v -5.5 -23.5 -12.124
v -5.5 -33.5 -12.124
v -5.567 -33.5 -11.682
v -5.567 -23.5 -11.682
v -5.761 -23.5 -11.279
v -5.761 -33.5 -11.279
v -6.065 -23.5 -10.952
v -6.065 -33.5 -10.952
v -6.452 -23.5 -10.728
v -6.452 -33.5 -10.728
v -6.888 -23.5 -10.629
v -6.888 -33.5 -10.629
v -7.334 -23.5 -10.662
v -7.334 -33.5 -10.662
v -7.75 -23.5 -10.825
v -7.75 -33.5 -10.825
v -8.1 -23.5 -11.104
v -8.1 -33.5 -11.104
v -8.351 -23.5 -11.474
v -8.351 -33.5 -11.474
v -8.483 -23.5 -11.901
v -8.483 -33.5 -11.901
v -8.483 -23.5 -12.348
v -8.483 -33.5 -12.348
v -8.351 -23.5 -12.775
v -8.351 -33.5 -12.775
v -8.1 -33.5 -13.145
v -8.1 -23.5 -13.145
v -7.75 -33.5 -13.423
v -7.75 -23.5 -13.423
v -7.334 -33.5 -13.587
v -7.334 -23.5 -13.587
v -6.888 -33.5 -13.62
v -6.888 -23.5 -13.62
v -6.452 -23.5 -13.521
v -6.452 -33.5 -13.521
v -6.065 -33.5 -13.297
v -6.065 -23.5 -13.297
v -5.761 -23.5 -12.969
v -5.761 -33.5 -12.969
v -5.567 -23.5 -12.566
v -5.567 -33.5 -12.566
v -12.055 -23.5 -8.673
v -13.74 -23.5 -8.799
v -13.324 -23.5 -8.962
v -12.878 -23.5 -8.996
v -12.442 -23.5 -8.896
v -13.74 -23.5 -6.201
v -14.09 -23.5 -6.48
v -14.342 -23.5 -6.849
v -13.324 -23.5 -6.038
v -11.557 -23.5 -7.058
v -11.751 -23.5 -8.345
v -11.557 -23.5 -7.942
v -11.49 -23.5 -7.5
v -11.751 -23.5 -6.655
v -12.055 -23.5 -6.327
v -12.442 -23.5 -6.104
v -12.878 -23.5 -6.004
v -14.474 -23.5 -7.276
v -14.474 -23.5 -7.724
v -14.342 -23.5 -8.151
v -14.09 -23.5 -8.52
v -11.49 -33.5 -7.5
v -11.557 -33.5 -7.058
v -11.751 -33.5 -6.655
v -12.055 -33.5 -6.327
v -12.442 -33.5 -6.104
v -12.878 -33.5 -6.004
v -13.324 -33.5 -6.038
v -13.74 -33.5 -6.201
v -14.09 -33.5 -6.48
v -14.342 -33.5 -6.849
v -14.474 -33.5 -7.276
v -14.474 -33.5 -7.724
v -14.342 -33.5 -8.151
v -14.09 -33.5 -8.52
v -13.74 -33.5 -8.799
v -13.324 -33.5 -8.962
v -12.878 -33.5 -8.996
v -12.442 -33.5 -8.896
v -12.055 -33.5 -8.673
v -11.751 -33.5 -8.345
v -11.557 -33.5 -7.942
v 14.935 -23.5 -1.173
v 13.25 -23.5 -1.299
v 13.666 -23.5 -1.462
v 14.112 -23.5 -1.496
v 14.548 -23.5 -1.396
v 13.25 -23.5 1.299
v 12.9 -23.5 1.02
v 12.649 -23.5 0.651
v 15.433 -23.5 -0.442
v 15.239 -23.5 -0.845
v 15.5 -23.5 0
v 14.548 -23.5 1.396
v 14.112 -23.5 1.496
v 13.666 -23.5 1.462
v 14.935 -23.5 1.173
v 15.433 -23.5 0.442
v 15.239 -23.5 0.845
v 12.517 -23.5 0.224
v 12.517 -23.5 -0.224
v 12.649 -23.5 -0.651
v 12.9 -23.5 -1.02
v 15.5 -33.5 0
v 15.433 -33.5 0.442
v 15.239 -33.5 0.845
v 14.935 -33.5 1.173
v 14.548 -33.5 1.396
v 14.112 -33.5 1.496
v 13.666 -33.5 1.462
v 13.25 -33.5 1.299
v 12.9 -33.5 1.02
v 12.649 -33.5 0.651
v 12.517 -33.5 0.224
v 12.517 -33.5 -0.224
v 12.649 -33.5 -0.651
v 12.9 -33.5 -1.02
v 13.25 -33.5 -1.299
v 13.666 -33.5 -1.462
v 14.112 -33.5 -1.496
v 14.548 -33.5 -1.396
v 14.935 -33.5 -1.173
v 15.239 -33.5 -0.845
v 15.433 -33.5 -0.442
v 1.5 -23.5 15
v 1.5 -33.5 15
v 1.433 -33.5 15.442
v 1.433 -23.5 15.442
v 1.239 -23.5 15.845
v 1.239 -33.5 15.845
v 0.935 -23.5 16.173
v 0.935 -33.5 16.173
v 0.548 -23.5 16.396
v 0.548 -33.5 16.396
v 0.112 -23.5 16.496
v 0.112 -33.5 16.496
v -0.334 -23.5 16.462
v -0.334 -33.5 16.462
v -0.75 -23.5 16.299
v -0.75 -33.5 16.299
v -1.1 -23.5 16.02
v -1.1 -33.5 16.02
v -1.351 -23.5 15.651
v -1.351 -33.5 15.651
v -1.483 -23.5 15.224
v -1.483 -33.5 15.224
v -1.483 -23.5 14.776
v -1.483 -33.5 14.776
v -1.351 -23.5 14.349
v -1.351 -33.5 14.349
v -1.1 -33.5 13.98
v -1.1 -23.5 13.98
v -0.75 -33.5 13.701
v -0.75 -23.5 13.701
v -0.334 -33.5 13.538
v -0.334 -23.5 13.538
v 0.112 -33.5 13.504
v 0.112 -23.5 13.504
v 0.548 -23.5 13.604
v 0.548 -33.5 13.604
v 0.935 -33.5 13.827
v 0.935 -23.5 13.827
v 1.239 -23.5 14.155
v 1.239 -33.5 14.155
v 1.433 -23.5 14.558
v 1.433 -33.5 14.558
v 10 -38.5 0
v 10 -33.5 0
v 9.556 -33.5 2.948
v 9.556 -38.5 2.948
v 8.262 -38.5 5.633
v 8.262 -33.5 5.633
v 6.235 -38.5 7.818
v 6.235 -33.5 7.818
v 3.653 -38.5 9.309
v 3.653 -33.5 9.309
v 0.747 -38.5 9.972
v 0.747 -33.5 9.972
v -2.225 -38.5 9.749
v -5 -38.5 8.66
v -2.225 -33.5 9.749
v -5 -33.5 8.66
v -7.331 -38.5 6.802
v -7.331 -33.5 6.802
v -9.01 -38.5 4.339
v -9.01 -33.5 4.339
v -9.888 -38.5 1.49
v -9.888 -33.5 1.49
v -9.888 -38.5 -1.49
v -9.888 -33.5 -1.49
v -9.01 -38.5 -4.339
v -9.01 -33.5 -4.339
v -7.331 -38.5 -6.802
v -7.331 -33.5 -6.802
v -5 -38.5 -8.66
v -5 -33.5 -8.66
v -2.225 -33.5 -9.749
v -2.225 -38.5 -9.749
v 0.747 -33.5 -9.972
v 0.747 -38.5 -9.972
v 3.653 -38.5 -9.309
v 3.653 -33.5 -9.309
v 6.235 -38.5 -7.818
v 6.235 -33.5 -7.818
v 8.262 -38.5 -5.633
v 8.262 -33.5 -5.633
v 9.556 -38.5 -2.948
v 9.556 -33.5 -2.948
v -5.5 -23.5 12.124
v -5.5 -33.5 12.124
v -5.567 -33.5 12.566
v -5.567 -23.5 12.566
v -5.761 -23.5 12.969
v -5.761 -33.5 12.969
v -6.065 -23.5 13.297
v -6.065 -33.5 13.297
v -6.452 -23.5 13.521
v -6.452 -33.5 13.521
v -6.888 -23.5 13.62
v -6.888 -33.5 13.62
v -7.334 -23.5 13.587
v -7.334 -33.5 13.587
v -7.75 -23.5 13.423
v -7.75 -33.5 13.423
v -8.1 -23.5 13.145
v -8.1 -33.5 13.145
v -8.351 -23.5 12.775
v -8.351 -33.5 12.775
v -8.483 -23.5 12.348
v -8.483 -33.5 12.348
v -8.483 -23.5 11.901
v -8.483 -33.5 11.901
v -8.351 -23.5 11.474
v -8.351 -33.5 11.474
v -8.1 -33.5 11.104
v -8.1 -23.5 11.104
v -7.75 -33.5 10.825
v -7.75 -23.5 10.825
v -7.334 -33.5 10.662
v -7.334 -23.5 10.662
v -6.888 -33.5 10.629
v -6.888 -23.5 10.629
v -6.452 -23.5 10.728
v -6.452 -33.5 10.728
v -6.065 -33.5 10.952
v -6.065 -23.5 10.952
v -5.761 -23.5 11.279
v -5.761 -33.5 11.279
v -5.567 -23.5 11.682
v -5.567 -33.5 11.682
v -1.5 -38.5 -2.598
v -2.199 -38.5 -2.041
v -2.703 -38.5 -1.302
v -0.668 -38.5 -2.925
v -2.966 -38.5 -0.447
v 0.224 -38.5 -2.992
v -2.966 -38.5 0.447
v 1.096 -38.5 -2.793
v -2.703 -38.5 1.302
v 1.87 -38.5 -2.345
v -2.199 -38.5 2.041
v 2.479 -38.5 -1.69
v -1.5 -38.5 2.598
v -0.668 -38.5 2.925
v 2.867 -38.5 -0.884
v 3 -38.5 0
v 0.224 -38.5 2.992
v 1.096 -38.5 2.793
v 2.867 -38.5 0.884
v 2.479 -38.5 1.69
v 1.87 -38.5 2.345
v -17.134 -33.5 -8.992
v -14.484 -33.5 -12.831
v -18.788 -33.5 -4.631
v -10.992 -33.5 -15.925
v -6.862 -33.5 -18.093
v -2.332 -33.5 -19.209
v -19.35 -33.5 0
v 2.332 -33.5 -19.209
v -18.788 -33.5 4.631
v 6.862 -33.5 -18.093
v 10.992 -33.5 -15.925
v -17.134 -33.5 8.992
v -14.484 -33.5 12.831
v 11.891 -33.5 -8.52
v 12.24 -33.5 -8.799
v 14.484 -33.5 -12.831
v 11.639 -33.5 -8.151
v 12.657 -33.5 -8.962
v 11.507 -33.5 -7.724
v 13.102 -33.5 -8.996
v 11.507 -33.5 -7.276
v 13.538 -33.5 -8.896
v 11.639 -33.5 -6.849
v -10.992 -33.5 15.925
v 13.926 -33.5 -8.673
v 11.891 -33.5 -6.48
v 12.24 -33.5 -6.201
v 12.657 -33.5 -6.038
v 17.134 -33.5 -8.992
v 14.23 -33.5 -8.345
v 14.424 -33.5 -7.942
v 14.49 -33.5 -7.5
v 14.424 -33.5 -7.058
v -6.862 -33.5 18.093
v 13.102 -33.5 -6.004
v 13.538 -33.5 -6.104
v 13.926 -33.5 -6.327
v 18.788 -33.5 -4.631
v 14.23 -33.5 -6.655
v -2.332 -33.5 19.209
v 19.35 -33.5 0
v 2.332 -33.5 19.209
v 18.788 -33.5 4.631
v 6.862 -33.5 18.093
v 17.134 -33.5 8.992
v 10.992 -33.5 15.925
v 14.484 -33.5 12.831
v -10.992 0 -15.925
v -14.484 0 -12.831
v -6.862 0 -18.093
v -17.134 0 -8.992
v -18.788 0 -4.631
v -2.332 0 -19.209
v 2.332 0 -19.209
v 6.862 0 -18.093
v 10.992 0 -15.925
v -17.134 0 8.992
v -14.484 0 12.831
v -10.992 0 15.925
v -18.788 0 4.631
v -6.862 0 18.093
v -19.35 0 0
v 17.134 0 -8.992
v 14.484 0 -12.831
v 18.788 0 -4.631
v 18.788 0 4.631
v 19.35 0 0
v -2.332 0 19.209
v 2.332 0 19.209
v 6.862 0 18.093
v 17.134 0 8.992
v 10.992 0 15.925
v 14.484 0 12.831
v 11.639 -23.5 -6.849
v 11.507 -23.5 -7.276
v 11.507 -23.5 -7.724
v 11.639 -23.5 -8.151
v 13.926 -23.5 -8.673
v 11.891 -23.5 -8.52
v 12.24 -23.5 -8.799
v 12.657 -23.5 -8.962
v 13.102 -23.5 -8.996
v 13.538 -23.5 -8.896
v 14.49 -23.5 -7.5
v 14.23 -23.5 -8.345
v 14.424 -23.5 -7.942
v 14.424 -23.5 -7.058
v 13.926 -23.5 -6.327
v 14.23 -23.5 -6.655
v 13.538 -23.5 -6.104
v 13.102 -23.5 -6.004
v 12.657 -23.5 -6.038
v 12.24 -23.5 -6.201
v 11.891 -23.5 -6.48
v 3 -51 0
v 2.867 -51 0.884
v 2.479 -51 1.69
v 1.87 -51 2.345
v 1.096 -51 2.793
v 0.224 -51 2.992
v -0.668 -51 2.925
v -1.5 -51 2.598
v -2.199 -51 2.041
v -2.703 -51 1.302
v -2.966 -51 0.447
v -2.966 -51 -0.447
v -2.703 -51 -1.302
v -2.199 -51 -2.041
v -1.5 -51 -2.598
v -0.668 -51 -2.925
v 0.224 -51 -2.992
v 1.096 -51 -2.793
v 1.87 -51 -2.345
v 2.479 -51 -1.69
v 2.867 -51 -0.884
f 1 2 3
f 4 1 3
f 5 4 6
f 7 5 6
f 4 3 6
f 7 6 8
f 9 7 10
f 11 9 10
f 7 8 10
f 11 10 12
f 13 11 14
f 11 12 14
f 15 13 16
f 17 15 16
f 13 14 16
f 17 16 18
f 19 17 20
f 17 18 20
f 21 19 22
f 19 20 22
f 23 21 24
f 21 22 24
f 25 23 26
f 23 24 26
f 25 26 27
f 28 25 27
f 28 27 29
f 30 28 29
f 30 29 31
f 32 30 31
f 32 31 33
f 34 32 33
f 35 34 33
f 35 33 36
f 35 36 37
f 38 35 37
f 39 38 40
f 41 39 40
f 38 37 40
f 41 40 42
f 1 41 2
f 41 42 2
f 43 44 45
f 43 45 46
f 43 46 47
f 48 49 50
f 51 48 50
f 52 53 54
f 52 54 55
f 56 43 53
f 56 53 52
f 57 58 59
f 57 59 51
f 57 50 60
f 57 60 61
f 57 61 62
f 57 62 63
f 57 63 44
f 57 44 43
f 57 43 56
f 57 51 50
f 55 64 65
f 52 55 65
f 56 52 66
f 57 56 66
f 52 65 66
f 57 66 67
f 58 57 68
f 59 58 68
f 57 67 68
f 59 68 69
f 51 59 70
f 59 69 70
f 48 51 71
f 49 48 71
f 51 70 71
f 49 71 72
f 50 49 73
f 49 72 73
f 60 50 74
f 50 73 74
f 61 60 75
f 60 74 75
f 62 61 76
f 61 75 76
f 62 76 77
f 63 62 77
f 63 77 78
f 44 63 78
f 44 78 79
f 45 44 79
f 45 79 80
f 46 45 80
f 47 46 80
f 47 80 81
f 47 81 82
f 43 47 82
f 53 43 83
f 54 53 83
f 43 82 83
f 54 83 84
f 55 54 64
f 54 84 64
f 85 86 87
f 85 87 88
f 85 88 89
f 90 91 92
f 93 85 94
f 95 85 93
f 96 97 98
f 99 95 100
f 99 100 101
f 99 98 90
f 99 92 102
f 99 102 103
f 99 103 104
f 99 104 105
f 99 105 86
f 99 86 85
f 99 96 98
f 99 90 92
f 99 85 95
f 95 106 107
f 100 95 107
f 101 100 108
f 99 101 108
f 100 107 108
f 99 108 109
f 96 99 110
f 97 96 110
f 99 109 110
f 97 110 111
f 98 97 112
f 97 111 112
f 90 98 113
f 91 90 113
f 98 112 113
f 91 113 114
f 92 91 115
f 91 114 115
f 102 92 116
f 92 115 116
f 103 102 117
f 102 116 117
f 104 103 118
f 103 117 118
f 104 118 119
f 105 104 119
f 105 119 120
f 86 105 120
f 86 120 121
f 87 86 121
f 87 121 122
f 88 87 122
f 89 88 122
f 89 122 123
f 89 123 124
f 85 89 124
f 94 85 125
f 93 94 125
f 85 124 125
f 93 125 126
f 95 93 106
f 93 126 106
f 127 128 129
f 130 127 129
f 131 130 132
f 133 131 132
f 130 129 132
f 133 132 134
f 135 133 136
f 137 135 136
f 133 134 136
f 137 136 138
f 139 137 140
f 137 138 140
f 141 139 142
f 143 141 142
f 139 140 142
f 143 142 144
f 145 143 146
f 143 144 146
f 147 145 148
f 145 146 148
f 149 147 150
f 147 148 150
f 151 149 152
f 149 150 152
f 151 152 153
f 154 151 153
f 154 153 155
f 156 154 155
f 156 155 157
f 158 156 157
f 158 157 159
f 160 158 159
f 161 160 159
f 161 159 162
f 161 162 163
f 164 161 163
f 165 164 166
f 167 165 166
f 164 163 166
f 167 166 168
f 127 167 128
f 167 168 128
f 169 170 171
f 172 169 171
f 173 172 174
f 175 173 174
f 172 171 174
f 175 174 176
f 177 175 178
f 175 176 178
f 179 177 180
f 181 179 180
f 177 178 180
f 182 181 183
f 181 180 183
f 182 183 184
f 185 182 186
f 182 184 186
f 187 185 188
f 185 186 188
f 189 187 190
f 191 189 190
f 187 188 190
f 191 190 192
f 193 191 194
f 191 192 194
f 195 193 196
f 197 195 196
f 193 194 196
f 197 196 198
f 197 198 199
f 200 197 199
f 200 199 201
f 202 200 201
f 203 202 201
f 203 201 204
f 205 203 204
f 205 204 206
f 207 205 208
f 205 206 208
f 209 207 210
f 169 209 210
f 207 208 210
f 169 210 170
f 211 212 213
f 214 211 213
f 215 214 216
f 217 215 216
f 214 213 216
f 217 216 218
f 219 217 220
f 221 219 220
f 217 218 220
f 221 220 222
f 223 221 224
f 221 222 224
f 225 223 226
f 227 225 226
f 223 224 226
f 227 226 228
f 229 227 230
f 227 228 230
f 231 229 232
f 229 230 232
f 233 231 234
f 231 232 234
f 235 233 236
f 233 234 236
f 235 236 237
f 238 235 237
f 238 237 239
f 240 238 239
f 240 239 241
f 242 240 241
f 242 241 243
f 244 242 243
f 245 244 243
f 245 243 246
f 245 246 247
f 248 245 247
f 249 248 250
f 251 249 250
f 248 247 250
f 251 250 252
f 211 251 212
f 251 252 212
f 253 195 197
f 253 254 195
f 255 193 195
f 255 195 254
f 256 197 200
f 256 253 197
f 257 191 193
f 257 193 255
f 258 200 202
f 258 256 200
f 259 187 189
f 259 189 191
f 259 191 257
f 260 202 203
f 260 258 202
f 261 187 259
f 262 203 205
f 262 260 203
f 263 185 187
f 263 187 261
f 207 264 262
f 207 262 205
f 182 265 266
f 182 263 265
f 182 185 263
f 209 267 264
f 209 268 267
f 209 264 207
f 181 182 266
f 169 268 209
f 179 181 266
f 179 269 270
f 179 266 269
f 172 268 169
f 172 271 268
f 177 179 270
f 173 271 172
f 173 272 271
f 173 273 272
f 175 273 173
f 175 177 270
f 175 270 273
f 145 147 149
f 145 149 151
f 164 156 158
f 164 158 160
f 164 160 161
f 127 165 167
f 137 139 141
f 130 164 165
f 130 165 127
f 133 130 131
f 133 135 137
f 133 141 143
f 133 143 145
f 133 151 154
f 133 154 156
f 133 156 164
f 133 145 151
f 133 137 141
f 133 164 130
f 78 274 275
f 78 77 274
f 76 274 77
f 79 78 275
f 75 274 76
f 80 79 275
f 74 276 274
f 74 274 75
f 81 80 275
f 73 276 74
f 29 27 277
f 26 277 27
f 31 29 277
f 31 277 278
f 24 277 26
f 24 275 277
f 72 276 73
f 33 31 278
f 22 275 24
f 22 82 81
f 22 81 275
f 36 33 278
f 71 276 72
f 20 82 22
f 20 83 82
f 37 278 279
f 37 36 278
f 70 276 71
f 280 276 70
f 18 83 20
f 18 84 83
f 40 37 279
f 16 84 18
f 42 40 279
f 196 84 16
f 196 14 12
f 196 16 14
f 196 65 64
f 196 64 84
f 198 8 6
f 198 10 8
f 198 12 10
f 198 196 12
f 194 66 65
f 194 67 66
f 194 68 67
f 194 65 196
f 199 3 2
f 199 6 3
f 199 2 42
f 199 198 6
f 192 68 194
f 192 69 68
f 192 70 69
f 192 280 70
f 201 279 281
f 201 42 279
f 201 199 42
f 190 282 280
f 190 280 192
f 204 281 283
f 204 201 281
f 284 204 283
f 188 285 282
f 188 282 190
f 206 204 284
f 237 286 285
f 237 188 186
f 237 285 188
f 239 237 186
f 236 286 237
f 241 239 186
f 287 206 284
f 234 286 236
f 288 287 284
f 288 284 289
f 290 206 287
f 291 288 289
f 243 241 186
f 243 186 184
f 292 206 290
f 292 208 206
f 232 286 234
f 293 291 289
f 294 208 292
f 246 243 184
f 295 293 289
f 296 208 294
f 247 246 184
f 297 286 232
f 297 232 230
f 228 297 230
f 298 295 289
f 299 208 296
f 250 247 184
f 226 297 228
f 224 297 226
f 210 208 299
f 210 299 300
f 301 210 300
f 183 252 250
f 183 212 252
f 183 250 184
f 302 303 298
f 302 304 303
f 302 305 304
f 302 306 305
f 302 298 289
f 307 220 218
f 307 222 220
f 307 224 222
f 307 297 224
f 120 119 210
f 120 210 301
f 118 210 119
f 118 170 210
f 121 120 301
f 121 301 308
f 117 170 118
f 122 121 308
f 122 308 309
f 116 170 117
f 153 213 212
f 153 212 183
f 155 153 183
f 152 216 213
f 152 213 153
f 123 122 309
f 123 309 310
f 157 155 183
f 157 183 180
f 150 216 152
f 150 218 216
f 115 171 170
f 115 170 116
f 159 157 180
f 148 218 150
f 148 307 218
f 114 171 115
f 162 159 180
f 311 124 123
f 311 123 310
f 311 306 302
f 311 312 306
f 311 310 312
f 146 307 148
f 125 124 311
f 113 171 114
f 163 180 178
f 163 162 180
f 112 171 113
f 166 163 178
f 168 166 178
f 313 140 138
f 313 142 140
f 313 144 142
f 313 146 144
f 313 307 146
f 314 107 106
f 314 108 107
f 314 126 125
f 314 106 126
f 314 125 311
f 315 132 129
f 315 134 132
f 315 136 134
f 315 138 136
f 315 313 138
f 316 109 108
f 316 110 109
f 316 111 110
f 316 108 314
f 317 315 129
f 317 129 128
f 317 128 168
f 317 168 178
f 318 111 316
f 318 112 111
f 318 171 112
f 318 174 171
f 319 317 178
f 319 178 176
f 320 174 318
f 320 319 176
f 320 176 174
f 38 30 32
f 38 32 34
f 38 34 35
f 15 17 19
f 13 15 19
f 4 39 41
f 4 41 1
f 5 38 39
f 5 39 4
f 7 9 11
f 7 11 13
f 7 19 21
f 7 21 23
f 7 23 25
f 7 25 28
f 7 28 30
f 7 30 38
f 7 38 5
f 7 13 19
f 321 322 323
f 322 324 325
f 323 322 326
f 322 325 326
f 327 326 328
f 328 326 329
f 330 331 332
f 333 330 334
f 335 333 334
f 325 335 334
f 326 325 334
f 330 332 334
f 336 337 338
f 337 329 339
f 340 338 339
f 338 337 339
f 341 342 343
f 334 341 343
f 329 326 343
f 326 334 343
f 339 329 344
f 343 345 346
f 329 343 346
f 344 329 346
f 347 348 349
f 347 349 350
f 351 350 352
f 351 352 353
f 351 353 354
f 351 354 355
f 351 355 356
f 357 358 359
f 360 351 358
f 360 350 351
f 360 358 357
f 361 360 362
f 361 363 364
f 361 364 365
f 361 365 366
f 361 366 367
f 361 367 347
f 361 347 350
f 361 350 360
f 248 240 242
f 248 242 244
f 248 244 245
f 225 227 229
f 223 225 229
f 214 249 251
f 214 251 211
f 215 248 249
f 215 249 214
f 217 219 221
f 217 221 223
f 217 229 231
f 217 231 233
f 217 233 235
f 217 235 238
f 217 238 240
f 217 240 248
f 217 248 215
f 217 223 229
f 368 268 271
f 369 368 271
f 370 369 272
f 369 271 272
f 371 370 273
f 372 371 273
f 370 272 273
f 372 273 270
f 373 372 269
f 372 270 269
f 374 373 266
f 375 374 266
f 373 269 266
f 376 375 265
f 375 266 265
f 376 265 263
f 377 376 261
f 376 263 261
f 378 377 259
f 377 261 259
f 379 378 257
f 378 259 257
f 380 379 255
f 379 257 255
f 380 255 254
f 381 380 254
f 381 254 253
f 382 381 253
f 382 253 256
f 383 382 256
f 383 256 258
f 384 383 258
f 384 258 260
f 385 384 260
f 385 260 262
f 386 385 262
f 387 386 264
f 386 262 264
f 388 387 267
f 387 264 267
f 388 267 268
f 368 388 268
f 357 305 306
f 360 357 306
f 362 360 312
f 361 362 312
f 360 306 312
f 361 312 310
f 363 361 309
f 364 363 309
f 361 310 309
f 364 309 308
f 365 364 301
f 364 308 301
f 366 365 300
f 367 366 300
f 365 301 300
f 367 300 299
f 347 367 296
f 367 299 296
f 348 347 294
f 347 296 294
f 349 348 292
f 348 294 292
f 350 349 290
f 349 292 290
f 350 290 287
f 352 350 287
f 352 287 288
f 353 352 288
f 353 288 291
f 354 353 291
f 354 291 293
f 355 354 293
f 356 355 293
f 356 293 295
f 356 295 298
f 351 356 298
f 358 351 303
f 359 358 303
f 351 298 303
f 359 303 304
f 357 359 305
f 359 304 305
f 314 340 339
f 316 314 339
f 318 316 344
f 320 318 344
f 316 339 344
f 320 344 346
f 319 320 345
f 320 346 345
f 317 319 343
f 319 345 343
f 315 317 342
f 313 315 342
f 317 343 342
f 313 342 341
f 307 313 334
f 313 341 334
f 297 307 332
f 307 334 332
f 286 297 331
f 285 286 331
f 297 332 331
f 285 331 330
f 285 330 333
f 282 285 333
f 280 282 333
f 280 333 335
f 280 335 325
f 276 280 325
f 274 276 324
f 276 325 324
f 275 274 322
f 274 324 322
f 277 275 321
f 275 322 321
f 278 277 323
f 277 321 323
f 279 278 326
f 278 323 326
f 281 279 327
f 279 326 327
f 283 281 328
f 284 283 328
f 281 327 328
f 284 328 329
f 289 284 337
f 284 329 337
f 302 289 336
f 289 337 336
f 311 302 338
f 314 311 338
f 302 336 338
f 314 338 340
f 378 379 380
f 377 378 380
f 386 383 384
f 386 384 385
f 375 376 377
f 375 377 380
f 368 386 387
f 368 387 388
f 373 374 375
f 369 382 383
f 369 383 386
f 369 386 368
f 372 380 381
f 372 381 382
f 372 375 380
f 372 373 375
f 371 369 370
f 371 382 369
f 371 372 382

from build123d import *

# Parameters (mm, degrees)
SKETCH_R     = 19.35
PAD_DEPTH    = 33.5
SKETCH001_R  = 10
PAD001_DEPTH = 5
SKETCH002_R  = 3
PAD002_DEPTH = 12.5
SKETCH003_R  = 1.5
POCKET_DEPTH = 10


with BuildPart() as part:
    # Sketch → Pad (new body)
    with BuildSketch(Plane.XZ):
        Circle(SKETCH_R)
    extrude(amount=PAD_DEPTH)

    # Sketch001 (on Face3 of Pad) → Pad001 (join)
    with BuildSketch(Plane.XZ.offset(33.5)):
        Circle(SKETCH001_R)
    extrude(amount=PAD001_DEPTH)

    # Sketch002 (on Face5 of Pad001) → Pad002 (join)
    with BuildSketch(Plane.XZ.offset(38.5)):
        Circle(SKETCH002_R)
    extrude(amount=PAD002_DEPTH)

    # Sketch003 (on Face3 of Pad002) → Pocket (cut)
    with BuildSketch(Plane.XZ.offset(33.5)):
        with Locations((14, 0)):
            Circle(SKETCH003_R)
        with Locations((-12.990382, -7.499998)):
            Circle(SKETCH003_R)
        with Locations((-6.999999, -12.124356)):
            Circle(SKETCH003_R)
        with Locations((12.990379, -7.500003)):
            Circle(SKETCH003_R)
        with Locations((0, 15)):
            Circle(SKETCH003_R)
        with Locations((-6.999999, 12.124356)):
            Circle(SKETCH003_R)
    extrude(amount=-POCKET_DEPTH, mode=Mode.SUBTRACT)


solid = part.part
